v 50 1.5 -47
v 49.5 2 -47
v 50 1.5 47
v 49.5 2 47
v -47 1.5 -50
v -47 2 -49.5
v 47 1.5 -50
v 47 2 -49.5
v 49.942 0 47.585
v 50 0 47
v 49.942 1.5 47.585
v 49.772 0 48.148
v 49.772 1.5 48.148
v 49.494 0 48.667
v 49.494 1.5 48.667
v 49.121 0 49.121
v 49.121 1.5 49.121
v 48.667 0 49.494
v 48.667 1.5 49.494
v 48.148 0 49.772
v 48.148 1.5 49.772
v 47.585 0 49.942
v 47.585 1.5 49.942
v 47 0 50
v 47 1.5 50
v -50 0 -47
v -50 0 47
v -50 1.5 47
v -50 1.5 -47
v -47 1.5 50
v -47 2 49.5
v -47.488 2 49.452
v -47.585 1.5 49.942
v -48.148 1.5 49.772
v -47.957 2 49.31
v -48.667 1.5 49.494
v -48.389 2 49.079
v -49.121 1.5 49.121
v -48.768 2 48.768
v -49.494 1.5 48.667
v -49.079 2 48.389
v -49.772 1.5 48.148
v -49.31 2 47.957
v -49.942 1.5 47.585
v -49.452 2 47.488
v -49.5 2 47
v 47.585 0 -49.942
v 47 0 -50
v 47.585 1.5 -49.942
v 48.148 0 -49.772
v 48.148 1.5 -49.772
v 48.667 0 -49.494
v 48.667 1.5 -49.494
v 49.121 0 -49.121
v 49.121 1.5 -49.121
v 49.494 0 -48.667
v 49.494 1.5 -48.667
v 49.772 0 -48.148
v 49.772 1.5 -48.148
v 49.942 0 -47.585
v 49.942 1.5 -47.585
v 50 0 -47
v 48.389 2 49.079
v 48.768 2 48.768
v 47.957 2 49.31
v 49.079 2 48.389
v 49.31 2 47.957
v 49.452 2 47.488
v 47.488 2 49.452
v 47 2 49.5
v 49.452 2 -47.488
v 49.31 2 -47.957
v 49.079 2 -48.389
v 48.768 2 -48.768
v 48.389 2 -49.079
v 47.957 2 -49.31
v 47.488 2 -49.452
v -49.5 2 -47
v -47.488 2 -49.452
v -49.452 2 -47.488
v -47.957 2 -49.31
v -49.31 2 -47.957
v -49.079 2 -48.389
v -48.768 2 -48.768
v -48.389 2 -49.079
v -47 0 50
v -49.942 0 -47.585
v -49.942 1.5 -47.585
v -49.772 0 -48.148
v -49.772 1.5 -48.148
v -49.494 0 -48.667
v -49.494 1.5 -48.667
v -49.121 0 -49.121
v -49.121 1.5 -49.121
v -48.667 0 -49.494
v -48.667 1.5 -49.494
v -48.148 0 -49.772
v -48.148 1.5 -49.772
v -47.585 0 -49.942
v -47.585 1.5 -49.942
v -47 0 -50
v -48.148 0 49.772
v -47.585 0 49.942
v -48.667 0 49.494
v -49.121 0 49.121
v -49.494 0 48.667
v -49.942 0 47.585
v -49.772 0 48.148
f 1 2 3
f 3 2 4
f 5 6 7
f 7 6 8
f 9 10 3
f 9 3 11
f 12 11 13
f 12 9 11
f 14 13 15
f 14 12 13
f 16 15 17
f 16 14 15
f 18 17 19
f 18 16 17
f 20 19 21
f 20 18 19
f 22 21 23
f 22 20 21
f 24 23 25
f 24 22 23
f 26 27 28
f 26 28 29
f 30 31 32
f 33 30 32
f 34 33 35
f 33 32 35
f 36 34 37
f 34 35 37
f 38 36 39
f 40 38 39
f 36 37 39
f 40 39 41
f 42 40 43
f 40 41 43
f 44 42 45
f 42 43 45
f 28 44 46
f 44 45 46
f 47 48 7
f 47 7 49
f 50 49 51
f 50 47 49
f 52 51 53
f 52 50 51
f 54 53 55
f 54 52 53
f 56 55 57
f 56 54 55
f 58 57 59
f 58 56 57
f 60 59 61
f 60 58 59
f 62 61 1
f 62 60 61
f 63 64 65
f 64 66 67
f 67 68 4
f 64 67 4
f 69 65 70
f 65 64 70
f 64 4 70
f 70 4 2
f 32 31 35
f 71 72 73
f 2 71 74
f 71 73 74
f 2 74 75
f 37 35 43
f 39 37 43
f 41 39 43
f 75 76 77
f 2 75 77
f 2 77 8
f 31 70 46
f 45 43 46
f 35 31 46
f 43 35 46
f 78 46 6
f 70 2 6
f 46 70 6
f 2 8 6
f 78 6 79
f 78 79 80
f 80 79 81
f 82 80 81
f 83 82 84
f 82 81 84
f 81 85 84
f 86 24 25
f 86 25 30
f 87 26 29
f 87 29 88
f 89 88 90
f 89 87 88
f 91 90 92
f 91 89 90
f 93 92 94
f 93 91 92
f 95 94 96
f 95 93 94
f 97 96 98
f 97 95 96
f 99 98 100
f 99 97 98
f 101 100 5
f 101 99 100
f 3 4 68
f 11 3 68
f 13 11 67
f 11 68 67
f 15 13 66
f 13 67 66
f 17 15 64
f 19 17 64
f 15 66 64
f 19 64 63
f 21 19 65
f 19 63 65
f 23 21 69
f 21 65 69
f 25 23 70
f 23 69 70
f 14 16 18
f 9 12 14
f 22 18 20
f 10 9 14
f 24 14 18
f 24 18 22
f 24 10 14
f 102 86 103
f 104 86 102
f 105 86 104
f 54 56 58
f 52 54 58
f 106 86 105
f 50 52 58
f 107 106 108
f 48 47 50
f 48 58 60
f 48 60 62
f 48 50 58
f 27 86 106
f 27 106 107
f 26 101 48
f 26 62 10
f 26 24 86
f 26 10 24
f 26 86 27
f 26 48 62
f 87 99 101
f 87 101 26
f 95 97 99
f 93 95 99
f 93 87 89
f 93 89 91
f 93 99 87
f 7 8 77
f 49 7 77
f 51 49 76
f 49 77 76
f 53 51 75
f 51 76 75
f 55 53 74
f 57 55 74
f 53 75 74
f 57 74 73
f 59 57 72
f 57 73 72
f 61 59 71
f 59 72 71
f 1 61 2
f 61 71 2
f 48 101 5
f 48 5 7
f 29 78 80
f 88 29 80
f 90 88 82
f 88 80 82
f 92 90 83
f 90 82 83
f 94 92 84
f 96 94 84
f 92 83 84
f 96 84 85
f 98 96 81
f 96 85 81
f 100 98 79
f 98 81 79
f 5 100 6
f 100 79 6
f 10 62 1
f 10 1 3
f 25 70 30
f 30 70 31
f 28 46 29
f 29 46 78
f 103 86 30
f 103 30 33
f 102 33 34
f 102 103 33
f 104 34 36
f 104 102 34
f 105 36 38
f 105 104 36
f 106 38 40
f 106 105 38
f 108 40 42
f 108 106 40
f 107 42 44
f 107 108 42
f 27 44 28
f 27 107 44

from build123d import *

# Parameters (mm, degrees)
EXTRUDE_1_DEPTH = 2
CHAMFER_1_SIZE  = 0.5


with BuildPart() as part:
    # 草图1 → 凸台-拉伸1 (new body)
    with BuildSketch(Plane(origin=(0, 0, 0), x_dir=(1, 0, 0), z_dir=(0, 1, 0))):
        with BuildLine():
            Line((-47, 50), (47, 50))
            ThreePointArc((47, 50), (49.121320344, 49.121320344), (50, 47))
            Line((50, 47), (50, -47))
            ThreePointArc((50, -47), (49.121320344, -49.121320344), (47, -50))
            Line((47, -50), (-47, -50))
            ThreePointArc((-47, -50), (-49.121320344, -49.121320344), (-50, -47))
            Line((-50, -47), (-50, 47))
            ThreePointArc((-50, 47), (-49.121320344, 49.121320344), (-47, 50))
        make_face()
    extrude(amount=EXTRUDE_1_DEPTH)

    # 倒角1
    chamfer_1_edges = [part.edges().sort_by_distance(p)[0] for p in [
        (-49.121320344, 2, -49.121320344),
        (-50, 2, 0),
        (-49.121320344, 2, 49.121320344),
        (0, 2, 50),
        (49.121320344, 2, 49.121320344),
        (50, 2, 0),
        (49.121320344, 2, -49.121320344),
        (0, 2, -50),
    ]]
    chamfer(chamfer_1_edges, length=CHAMFER_1_SIZE)


solid = part.part
